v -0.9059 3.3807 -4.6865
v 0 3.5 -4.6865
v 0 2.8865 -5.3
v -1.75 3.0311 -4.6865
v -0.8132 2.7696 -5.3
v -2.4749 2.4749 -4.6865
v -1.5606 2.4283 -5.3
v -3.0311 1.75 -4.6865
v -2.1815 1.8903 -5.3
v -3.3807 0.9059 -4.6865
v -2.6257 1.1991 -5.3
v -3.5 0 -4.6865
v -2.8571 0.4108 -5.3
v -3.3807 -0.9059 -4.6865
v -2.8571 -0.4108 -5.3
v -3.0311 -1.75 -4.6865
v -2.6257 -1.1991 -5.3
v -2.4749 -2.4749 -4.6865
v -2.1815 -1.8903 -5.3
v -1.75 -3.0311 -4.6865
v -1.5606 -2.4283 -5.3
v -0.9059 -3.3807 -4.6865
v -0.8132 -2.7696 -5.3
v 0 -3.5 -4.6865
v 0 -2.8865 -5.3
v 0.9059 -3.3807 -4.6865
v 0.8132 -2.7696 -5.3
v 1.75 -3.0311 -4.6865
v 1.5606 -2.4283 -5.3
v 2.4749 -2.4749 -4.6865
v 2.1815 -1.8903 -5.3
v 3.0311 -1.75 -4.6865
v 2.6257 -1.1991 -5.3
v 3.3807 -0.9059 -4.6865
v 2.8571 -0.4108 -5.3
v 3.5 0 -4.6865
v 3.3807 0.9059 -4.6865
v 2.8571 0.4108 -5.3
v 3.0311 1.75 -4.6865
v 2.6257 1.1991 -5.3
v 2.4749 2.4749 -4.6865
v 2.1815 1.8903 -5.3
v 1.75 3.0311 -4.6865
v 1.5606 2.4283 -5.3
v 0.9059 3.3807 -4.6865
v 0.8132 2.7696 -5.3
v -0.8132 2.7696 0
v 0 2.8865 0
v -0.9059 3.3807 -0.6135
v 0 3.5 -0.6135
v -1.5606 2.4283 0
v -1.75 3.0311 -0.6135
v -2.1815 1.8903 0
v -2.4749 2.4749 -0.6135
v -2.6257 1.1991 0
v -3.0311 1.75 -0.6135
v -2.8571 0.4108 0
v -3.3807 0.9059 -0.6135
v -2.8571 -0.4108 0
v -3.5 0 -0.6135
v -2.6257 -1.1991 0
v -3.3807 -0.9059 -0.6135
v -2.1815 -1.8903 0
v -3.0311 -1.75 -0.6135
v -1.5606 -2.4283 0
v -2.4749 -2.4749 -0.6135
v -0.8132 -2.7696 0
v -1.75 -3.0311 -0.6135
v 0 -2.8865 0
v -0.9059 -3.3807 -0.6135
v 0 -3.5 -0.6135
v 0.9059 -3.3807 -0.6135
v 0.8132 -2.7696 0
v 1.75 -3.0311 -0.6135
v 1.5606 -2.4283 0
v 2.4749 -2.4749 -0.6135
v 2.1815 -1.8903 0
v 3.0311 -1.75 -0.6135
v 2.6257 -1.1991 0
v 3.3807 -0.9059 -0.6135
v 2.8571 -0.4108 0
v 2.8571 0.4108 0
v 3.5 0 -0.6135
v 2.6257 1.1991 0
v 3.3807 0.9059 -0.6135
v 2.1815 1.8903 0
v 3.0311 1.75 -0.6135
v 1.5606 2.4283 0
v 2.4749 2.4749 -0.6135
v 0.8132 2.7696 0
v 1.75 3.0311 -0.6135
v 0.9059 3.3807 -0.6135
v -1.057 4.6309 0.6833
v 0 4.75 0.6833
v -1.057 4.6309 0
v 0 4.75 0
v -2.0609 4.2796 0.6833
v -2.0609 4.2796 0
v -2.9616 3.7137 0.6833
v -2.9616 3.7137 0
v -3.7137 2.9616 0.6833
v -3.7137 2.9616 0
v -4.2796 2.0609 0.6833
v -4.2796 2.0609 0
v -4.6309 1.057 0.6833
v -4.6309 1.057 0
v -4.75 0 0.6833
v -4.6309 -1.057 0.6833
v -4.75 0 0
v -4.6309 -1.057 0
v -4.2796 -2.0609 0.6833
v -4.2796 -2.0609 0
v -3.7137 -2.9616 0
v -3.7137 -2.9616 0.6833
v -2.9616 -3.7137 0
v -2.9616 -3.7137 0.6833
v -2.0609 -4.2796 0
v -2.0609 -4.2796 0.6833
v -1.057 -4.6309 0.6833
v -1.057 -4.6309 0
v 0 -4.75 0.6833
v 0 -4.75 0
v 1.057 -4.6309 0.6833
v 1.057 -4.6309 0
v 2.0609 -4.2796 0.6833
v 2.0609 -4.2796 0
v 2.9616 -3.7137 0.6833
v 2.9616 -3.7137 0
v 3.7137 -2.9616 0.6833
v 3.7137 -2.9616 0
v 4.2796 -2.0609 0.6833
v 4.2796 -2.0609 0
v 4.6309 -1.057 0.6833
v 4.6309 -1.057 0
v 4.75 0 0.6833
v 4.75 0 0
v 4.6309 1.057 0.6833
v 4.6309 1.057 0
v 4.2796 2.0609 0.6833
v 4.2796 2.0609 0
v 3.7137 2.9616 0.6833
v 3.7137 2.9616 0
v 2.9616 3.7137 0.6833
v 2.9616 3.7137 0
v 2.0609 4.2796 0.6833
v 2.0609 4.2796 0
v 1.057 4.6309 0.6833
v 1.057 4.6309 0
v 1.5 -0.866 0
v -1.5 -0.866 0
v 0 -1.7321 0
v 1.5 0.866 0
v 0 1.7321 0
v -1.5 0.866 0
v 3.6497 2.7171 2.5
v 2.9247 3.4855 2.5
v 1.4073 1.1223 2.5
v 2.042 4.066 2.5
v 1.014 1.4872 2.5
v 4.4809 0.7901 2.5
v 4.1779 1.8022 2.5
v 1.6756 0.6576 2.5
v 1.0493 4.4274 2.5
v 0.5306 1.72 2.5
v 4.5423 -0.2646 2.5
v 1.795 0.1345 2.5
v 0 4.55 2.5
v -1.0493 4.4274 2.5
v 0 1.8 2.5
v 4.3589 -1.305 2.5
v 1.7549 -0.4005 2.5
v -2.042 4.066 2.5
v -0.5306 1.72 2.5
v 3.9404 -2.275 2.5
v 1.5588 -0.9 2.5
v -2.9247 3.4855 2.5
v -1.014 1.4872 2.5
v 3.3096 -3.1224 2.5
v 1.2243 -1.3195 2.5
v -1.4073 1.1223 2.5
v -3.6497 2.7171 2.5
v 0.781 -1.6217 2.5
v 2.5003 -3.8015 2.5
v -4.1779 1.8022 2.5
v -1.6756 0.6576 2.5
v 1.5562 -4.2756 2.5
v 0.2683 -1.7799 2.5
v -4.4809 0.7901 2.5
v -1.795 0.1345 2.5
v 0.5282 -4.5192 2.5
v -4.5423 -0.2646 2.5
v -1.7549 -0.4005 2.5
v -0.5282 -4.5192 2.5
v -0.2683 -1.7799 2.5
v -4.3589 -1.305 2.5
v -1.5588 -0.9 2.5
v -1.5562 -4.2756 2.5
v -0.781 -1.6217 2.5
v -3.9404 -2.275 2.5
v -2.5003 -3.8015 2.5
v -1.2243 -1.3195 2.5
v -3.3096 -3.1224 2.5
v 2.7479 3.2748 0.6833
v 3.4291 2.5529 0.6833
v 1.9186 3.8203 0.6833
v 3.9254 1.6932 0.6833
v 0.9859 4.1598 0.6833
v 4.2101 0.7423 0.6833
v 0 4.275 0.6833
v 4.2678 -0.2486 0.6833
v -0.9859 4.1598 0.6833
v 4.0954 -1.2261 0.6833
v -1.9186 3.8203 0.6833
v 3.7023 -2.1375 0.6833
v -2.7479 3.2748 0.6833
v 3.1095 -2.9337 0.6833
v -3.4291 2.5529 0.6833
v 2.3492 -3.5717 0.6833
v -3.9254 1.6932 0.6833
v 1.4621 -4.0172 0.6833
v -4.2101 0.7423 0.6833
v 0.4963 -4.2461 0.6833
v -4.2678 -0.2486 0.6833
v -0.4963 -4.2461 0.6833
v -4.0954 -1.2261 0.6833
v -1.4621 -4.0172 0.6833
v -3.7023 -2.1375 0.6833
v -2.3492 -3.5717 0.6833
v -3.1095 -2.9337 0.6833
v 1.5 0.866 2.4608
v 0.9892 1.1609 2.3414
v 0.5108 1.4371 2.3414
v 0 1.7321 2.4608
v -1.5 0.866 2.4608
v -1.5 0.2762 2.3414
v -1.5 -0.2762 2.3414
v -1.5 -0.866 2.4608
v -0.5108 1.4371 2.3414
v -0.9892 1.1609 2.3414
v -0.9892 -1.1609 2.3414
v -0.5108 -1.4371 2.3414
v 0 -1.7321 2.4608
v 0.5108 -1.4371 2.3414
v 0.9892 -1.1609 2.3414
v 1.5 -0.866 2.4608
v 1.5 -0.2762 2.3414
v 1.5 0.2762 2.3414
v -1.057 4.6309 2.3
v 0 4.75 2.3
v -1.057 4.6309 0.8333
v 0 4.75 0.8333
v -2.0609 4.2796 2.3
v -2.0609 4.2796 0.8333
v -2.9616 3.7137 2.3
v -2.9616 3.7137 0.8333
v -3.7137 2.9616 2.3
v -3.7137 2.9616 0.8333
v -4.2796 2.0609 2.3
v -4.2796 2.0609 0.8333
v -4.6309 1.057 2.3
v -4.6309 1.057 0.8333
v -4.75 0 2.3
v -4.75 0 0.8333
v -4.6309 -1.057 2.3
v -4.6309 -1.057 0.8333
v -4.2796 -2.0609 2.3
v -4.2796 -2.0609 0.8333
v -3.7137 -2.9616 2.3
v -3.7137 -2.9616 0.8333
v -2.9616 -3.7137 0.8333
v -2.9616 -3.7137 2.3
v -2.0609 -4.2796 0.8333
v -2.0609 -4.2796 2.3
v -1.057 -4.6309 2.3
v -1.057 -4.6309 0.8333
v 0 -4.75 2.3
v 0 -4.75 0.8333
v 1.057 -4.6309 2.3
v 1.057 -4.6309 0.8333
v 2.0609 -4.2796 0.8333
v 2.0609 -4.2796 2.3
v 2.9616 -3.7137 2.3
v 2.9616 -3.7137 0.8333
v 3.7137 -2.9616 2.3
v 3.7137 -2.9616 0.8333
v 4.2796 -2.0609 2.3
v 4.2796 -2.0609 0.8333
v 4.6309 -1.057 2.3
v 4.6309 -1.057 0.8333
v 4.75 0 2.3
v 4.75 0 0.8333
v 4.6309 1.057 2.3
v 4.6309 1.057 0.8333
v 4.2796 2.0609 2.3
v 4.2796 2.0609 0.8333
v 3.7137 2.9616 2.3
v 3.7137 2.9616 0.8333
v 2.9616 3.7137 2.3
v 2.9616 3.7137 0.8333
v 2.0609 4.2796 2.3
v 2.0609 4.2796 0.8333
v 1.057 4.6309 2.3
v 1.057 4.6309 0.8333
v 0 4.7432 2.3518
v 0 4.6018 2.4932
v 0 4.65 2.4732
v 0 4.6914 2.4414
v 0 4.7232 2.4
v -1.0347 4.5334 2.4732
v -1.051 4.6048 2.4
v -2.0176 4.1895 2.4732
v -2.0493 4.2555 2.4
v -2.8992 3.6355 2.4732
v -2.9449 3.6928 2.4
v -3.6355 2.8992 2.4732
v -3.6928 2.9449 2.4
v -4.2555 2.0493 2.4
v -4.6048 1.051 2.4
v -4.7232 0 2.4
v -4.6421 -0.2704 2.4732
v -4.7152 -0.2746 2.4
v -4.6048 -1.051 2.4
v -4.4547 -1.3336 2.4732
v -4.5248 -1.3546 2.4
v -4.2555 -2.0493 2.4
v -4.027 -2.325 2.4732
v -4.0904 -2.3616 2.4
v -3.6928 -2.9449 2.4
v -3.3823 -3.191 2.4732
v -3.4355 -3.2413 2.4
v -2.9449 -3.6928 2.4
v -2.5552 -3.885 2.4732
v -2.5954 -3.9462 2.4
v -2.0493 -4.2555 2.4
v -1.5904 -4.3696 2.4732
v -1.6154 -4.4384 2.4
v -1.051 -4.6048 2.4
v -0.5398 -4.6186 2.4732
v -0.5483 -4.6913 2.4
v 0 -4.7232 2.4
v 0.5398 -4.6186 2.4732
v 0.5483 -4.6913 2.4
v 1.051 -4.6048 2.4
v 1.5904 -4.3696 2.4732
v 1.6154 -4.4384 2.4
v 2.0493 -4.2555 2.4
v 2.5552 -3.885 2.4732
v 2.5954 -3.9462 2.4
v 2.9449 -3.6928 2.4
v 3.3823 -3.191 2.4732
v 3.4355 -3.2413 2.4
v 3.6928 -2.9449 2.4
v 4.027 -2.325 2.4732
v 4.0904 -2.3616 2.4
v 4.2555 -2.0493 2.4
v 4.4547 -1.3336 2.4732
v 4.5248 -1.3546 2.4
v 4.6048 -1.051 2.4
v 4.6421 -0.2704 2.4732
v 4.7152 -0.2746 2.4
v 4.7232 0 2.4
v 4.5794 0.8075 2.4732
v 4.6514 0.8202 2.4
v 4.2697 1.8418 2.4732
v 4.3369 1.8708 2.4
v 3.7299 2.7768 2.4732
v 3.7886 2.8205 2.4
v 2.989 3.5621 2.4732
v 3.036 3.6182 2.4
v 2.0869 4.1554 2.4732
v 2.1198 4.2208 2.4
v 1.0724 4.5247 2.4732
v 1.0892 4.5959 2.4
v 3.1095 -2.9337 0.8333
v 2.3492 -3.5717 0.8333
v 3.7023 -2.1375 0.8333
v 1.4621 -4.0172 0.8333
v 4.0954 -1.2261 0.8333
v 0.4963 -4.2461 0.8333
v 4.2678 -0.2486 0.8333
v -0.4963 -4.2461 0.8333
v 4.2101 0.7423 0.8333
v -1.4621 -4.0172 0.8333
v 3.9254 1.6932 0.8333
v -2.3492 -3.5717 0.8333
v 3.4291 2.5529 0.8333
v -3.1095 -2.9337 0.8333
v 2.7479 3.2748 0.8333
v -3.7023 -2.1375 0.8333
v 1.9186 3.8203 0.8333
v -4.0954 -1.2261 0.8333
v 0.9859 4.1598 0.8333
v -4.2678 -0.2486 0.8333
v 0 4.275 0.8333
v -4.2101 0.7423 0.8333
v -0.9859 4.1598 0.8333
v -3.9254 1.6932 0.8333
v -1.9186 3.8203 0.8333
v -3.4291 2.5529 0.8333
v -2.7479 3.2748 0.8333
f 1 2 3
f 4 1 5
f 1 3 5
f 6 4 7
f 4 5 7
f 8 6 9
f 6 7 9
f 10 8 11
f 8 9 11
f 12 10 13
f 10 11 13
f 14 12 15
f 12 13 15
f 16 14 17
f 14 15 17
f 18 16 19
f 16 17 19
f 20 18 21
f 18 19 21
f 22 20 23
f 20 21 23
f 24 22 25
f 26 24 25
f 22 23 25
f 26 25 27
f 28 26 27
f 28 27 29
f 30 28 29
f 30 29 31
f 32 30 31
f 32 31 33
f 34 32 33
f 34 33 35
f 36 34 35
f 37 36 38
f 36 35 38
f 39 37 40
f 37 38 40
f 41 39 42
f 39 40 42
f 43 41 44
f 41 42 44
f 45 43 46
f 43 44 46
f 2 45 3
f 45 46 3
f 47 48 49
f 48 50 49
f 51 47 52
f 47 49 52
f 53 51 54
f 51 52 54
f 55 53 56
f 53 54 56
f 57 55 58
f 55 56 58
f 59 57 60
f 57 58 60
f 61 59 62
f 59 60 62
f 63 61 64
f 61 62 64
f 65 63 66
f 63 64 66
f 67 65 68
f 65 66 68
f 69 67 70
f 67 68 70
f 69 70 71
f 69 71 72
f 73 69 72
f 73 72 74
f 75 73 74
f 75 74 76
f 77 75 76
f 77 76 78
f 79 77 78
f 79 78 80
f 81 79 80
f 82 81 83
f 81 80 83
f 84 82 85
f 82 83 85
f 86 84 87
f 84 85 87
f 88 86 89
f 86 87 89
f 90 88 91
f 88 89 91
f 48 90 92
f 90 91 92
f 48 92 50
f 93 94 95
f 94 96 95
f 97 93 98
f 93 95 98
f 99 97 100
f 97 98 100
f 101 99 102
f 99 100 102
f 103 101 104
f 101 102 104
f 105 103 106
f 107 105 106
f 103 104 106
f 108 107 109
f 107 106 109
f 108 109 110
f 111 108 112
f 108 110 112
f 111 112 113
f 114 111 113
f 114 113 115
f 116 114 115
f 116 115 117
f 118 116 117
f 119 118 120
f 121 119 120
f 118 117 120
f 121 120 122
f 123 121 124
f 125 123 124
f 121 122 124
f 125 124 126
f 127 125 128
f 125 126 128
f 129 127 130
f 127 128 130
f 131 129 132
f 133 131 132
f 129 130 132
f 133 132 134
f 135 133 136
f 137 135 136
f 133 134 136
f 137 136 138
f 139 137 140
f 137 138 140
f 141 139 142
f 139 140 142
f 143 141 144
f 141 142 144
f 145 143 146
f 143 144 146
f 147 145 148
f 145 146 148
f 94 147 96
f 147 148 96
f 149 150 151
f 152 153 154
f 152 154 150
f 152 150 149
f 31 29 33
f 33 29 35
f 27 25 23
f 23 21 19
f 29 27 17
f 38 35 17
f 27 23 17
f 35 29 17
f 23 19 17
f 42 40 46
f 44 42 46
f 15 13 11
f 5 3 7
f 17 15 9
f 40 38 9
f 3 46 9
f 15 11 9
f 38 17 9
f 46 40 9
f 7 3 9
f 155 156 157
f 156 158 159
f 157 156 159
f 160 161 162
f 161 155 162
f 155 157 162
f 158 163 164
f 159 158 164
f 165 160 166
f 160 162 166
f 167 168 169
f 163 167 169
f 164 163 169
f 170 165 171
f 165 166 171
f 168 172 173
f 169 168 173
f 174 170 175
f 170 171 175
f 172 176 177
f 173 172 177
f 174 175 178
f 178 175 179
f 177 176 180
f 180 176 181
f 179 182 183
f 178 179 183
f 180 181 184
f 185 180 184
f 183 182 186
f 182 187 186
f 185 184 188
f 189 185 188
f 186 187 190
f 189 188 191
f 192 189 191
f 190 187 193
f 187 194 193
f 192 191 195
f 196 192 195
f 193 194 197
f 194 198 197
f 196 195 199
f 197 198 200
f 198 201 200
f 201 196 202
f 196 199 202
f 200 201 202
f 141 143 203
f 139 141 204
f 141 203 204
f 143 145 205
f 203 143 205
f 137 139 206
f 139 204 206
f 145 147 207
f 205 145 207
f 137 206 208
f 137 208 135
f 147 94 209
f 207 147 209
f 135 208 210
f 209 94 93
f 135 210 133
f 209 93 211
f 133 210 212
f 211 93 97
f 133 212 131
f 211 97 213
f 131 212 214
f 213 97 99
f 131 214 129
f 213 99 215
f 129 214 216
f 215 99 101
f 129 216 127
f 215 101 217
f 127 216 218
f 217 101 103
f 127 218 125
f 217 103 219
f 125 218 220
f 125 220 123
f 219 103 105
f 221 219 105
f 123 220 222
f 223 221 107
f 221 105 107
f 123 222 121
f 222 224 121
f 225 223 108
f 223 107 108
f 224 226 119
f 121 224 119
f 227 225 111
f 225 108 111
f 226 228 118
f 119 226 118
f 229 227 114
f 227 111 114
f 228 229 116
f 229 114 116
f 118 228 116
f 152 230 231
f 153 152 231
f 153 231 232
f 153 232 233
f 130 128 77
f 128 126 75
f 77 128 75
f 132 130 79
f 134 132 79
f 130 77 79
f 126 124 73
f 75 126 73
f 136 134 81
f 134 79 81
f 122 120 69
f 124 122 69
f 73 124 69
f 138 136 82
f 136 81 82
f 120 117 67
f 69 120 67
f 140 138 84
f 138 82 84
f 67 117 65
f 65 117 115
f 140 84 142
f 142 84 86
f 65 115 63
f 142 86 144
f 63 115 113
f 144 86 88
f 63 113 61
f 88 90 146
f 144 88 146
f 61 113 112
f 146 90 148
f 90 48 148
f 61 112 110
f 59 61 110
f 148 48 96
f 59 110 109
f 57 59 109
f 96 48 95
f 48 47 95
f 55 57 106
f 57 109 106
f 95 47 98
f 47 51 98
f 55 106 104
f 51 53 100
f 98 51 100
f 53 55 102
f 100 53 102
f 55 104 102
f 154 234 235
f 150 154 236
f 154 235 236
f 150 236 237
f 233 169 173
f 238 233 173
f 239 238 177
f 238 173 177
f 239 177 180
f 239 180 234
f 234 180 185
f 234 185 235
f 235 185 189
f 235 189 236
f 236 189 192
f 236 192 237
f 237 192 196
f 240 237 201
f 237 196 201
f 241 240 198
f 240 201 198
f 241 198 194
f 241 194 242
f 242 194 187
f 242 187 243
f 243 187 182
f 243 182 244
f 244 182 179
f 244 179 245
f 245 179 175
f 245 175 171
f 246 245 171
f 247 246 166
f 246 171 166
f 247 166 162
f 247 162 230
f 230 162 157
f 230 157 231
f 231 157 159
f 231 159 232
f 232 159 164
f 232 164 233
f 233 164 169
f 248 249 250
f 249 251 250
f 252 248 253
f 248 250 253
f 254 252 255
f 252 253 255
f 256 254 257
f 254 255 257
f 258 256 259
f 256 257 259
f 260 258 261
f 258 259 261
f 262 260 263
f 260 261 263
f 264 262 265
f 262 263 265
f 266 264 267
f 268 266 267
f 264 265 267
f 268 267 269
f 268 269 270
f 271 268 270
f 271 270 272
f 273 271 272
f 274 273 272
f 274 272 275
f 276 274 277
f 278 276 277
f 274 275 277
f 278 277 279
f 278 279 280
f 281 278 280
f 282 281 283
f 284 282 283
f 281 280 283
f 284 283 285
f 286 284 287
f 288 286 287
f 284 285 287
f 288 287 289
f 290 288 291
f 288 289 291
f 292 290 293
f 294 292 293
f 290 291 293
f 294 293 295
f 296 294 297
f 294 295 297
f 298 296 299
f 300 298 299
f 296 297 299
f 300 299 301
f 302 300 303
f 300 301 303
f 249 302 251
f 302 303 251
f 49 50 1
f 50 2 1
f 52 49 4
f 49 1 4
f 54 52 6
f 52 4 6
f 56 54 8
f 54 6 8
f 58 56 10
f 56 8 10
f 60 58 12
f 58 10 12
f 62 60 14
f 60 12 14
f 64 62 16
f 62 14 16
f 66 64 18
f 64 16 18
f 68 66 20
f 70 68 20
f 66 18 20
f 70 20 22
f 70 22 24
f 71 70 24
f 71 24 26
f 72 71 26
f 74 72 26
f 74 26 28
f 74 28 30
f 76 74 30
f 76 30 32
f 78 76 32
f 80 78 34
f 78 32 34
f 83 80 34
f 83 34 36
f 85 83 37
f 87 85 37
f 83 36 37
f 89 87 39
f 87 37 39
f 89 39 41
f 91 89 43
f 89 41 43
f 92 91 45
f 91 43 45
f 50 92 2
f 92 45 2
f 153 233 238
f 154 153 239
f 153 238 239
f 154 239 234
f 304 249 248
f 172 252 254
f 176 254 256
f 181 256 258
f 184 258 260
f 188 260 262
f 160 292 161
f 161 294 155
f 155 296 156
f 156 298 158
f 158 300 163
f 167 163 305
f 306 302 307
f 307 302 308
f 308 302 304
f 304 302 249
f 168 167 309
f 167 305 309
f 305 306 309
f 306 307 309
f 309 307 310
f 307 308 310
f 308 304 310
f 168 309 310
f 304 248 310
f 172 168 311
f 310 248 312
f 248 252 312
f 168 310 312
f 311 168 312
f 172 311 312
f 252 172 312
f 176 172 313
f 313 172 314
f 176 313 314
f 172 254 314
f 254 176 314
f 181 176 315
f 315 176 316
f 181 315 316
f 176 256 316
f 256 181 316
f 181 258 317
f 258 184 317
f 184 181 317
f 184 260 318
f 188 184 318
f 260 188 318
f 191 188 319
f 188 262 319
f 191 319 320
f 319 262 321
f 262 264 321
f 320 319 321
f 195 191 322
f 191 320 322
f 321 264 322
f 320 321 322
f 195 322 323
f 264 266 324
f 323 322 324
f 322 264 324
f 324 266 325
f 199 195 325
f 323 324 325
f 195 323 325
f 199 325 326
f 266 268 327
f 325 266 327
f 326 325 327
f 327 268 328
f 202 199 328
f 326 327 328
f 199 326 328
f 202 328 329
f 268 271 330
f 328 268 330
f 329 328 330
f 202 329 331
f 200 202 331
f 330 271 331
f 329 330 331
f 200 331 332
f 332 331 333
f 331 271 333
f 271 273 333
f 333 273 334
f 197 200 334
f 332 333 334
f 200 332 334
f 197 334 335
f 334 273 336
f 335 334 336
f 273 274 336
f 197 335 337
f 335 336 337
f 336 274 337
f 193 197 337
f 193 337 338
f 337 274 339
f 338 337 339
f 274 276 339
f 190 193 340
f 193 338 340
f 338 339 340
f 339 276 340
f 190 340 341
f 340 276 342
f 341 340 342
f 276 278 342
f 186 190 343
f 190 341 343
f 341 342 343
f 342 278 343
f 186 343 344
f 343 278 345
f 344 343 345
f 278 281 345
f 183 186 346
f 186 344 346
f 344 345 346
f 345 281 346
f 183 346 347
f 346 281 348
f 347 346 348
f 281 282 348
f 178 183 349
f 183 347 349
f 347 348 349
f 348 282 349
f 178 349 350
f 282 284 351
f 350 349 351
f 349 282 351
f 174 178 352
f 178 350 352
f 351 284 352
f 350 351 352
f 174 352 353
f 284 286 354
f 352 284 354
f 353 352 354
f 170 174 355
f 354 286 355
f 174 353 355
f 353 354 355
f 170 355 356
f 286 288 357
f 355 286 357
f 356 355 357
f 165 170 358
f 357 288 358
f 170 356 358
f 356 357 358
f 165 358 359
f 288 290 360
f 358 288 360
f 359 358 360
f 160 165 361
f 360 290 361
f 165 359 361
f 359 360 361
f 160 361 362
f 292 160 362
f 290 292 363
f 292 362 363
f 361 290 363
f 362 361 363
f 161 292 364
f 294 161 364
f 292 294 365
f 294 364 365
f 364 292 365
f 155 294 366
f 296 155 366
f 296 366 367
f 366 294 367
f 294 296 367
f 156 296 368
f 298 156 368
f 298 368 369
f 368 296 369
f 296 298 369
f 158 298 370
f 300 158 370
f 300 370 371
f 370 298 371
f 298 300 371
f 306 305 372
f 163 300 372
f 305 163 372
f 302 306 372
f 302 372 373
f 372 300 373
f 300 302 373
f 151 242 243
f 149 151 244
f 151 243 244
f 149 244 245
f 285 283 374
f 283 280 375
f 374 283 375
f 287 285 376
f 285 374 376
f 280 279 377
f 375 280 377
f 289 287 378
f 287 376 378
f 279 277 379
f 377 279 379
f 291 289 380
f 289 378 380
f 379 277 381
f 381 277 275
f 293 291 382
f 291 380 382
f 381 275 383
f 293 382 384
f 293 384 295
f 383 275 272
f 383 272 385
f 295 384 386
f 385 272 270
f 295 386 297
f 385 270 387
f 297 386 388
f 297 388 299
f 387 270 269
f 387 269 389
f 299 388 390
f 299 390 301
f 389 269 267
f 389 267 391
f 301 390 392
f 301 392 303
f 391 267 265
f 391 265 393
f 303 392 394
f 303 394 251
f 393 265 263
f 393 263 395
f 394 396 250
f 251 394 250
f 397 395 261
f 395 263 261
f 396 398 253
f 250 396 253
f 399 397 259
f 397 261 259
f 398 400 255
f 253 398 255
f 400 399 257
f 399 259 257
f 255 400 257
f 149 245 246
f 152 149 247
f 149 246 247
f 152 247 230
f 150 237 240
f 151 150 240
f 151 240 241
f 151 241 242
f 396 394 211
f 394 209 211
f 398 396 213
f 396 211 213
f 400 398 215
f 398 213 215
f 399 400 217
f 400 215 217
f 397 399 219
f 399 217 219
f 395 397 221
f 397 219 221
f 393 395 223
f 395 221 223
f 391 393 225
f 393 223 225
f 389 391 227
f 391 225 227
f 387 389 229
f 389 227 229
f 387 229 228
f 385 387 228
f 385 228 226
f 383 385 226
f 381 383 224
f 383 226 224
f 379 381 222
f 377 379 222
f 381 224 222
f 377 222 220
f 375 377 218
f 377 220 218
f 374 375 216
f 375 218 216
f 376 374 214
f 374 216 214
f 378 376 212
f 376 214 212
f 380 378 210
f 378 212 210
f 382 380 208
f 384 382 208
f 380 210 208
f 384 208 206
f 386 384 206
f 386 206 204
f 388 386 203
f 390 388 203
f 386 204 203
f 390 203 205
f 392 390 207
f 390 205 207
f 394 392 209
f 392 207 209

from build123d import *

# Parameters (mm, degrees)
CUT_EXTRUDE1_DEPTH = 2.5


with BuildPart() as part:
    # Sketch1 → Revolve1 (revolve)
    with BuildSketch(Plane(origin=(0, 0, 0), x_dir=(0, 0, -1), z_dir=(1, 0, 0))):
        with BuildLine():
            Line((-1.460769515, 0), (-2.5, 1.8))
            Line((-2.5, 1.8), (-2.5, 4.55))
            ThreePointArc((-2.5, 4.55), (-2.441421356, 4.691421356), (-2.3, 4.75))
            Line((-2.3, 4.75), (-0.833333333, 4.75))
            Line((-0.833333333, 4.75), (-0.833333333, 4.275))
            Line((-0.833333333, 4.275), (-0.683333333, 4.275))
            Line((-0.683333333, 4.275), (-0.683333333, 4.75))
            Line((-0.683333333, 4.75), (0, 4.75))
            Line((0, 4.75), (0, 2.8865))
            Line((0, 2.8865), (0.6135, 3.5))
            Line((0.6135, 3.5), (4.6865, 3.5))
            Line((4.6865, 3.5), (5.3, 2.8865))
            Line((5.3, 2.8865), (5.3, 0))
            Line((5.3, 0), (-1.460769515, 0))
        make_face()
    revolve(axis=Axis((0, 0, -5.3), (0, 0, 1)))

    # Sketch2 → Cut-Extrude1 (cut)
    with BuildSketch(Plane.XY.offset(2.5)):
        Polygon((-1.5, -0.866025404), (0, -1.732050808), (1.5, -0.866025404), (1.5, 0.866025404), (0, 1.732050808), (-1.5, 0.866025404), align=None)
    extrude(amount=-CUT_EXTRUDE1_DEPTH, mode=Mode.SUBTRACT)


solid = part.part
